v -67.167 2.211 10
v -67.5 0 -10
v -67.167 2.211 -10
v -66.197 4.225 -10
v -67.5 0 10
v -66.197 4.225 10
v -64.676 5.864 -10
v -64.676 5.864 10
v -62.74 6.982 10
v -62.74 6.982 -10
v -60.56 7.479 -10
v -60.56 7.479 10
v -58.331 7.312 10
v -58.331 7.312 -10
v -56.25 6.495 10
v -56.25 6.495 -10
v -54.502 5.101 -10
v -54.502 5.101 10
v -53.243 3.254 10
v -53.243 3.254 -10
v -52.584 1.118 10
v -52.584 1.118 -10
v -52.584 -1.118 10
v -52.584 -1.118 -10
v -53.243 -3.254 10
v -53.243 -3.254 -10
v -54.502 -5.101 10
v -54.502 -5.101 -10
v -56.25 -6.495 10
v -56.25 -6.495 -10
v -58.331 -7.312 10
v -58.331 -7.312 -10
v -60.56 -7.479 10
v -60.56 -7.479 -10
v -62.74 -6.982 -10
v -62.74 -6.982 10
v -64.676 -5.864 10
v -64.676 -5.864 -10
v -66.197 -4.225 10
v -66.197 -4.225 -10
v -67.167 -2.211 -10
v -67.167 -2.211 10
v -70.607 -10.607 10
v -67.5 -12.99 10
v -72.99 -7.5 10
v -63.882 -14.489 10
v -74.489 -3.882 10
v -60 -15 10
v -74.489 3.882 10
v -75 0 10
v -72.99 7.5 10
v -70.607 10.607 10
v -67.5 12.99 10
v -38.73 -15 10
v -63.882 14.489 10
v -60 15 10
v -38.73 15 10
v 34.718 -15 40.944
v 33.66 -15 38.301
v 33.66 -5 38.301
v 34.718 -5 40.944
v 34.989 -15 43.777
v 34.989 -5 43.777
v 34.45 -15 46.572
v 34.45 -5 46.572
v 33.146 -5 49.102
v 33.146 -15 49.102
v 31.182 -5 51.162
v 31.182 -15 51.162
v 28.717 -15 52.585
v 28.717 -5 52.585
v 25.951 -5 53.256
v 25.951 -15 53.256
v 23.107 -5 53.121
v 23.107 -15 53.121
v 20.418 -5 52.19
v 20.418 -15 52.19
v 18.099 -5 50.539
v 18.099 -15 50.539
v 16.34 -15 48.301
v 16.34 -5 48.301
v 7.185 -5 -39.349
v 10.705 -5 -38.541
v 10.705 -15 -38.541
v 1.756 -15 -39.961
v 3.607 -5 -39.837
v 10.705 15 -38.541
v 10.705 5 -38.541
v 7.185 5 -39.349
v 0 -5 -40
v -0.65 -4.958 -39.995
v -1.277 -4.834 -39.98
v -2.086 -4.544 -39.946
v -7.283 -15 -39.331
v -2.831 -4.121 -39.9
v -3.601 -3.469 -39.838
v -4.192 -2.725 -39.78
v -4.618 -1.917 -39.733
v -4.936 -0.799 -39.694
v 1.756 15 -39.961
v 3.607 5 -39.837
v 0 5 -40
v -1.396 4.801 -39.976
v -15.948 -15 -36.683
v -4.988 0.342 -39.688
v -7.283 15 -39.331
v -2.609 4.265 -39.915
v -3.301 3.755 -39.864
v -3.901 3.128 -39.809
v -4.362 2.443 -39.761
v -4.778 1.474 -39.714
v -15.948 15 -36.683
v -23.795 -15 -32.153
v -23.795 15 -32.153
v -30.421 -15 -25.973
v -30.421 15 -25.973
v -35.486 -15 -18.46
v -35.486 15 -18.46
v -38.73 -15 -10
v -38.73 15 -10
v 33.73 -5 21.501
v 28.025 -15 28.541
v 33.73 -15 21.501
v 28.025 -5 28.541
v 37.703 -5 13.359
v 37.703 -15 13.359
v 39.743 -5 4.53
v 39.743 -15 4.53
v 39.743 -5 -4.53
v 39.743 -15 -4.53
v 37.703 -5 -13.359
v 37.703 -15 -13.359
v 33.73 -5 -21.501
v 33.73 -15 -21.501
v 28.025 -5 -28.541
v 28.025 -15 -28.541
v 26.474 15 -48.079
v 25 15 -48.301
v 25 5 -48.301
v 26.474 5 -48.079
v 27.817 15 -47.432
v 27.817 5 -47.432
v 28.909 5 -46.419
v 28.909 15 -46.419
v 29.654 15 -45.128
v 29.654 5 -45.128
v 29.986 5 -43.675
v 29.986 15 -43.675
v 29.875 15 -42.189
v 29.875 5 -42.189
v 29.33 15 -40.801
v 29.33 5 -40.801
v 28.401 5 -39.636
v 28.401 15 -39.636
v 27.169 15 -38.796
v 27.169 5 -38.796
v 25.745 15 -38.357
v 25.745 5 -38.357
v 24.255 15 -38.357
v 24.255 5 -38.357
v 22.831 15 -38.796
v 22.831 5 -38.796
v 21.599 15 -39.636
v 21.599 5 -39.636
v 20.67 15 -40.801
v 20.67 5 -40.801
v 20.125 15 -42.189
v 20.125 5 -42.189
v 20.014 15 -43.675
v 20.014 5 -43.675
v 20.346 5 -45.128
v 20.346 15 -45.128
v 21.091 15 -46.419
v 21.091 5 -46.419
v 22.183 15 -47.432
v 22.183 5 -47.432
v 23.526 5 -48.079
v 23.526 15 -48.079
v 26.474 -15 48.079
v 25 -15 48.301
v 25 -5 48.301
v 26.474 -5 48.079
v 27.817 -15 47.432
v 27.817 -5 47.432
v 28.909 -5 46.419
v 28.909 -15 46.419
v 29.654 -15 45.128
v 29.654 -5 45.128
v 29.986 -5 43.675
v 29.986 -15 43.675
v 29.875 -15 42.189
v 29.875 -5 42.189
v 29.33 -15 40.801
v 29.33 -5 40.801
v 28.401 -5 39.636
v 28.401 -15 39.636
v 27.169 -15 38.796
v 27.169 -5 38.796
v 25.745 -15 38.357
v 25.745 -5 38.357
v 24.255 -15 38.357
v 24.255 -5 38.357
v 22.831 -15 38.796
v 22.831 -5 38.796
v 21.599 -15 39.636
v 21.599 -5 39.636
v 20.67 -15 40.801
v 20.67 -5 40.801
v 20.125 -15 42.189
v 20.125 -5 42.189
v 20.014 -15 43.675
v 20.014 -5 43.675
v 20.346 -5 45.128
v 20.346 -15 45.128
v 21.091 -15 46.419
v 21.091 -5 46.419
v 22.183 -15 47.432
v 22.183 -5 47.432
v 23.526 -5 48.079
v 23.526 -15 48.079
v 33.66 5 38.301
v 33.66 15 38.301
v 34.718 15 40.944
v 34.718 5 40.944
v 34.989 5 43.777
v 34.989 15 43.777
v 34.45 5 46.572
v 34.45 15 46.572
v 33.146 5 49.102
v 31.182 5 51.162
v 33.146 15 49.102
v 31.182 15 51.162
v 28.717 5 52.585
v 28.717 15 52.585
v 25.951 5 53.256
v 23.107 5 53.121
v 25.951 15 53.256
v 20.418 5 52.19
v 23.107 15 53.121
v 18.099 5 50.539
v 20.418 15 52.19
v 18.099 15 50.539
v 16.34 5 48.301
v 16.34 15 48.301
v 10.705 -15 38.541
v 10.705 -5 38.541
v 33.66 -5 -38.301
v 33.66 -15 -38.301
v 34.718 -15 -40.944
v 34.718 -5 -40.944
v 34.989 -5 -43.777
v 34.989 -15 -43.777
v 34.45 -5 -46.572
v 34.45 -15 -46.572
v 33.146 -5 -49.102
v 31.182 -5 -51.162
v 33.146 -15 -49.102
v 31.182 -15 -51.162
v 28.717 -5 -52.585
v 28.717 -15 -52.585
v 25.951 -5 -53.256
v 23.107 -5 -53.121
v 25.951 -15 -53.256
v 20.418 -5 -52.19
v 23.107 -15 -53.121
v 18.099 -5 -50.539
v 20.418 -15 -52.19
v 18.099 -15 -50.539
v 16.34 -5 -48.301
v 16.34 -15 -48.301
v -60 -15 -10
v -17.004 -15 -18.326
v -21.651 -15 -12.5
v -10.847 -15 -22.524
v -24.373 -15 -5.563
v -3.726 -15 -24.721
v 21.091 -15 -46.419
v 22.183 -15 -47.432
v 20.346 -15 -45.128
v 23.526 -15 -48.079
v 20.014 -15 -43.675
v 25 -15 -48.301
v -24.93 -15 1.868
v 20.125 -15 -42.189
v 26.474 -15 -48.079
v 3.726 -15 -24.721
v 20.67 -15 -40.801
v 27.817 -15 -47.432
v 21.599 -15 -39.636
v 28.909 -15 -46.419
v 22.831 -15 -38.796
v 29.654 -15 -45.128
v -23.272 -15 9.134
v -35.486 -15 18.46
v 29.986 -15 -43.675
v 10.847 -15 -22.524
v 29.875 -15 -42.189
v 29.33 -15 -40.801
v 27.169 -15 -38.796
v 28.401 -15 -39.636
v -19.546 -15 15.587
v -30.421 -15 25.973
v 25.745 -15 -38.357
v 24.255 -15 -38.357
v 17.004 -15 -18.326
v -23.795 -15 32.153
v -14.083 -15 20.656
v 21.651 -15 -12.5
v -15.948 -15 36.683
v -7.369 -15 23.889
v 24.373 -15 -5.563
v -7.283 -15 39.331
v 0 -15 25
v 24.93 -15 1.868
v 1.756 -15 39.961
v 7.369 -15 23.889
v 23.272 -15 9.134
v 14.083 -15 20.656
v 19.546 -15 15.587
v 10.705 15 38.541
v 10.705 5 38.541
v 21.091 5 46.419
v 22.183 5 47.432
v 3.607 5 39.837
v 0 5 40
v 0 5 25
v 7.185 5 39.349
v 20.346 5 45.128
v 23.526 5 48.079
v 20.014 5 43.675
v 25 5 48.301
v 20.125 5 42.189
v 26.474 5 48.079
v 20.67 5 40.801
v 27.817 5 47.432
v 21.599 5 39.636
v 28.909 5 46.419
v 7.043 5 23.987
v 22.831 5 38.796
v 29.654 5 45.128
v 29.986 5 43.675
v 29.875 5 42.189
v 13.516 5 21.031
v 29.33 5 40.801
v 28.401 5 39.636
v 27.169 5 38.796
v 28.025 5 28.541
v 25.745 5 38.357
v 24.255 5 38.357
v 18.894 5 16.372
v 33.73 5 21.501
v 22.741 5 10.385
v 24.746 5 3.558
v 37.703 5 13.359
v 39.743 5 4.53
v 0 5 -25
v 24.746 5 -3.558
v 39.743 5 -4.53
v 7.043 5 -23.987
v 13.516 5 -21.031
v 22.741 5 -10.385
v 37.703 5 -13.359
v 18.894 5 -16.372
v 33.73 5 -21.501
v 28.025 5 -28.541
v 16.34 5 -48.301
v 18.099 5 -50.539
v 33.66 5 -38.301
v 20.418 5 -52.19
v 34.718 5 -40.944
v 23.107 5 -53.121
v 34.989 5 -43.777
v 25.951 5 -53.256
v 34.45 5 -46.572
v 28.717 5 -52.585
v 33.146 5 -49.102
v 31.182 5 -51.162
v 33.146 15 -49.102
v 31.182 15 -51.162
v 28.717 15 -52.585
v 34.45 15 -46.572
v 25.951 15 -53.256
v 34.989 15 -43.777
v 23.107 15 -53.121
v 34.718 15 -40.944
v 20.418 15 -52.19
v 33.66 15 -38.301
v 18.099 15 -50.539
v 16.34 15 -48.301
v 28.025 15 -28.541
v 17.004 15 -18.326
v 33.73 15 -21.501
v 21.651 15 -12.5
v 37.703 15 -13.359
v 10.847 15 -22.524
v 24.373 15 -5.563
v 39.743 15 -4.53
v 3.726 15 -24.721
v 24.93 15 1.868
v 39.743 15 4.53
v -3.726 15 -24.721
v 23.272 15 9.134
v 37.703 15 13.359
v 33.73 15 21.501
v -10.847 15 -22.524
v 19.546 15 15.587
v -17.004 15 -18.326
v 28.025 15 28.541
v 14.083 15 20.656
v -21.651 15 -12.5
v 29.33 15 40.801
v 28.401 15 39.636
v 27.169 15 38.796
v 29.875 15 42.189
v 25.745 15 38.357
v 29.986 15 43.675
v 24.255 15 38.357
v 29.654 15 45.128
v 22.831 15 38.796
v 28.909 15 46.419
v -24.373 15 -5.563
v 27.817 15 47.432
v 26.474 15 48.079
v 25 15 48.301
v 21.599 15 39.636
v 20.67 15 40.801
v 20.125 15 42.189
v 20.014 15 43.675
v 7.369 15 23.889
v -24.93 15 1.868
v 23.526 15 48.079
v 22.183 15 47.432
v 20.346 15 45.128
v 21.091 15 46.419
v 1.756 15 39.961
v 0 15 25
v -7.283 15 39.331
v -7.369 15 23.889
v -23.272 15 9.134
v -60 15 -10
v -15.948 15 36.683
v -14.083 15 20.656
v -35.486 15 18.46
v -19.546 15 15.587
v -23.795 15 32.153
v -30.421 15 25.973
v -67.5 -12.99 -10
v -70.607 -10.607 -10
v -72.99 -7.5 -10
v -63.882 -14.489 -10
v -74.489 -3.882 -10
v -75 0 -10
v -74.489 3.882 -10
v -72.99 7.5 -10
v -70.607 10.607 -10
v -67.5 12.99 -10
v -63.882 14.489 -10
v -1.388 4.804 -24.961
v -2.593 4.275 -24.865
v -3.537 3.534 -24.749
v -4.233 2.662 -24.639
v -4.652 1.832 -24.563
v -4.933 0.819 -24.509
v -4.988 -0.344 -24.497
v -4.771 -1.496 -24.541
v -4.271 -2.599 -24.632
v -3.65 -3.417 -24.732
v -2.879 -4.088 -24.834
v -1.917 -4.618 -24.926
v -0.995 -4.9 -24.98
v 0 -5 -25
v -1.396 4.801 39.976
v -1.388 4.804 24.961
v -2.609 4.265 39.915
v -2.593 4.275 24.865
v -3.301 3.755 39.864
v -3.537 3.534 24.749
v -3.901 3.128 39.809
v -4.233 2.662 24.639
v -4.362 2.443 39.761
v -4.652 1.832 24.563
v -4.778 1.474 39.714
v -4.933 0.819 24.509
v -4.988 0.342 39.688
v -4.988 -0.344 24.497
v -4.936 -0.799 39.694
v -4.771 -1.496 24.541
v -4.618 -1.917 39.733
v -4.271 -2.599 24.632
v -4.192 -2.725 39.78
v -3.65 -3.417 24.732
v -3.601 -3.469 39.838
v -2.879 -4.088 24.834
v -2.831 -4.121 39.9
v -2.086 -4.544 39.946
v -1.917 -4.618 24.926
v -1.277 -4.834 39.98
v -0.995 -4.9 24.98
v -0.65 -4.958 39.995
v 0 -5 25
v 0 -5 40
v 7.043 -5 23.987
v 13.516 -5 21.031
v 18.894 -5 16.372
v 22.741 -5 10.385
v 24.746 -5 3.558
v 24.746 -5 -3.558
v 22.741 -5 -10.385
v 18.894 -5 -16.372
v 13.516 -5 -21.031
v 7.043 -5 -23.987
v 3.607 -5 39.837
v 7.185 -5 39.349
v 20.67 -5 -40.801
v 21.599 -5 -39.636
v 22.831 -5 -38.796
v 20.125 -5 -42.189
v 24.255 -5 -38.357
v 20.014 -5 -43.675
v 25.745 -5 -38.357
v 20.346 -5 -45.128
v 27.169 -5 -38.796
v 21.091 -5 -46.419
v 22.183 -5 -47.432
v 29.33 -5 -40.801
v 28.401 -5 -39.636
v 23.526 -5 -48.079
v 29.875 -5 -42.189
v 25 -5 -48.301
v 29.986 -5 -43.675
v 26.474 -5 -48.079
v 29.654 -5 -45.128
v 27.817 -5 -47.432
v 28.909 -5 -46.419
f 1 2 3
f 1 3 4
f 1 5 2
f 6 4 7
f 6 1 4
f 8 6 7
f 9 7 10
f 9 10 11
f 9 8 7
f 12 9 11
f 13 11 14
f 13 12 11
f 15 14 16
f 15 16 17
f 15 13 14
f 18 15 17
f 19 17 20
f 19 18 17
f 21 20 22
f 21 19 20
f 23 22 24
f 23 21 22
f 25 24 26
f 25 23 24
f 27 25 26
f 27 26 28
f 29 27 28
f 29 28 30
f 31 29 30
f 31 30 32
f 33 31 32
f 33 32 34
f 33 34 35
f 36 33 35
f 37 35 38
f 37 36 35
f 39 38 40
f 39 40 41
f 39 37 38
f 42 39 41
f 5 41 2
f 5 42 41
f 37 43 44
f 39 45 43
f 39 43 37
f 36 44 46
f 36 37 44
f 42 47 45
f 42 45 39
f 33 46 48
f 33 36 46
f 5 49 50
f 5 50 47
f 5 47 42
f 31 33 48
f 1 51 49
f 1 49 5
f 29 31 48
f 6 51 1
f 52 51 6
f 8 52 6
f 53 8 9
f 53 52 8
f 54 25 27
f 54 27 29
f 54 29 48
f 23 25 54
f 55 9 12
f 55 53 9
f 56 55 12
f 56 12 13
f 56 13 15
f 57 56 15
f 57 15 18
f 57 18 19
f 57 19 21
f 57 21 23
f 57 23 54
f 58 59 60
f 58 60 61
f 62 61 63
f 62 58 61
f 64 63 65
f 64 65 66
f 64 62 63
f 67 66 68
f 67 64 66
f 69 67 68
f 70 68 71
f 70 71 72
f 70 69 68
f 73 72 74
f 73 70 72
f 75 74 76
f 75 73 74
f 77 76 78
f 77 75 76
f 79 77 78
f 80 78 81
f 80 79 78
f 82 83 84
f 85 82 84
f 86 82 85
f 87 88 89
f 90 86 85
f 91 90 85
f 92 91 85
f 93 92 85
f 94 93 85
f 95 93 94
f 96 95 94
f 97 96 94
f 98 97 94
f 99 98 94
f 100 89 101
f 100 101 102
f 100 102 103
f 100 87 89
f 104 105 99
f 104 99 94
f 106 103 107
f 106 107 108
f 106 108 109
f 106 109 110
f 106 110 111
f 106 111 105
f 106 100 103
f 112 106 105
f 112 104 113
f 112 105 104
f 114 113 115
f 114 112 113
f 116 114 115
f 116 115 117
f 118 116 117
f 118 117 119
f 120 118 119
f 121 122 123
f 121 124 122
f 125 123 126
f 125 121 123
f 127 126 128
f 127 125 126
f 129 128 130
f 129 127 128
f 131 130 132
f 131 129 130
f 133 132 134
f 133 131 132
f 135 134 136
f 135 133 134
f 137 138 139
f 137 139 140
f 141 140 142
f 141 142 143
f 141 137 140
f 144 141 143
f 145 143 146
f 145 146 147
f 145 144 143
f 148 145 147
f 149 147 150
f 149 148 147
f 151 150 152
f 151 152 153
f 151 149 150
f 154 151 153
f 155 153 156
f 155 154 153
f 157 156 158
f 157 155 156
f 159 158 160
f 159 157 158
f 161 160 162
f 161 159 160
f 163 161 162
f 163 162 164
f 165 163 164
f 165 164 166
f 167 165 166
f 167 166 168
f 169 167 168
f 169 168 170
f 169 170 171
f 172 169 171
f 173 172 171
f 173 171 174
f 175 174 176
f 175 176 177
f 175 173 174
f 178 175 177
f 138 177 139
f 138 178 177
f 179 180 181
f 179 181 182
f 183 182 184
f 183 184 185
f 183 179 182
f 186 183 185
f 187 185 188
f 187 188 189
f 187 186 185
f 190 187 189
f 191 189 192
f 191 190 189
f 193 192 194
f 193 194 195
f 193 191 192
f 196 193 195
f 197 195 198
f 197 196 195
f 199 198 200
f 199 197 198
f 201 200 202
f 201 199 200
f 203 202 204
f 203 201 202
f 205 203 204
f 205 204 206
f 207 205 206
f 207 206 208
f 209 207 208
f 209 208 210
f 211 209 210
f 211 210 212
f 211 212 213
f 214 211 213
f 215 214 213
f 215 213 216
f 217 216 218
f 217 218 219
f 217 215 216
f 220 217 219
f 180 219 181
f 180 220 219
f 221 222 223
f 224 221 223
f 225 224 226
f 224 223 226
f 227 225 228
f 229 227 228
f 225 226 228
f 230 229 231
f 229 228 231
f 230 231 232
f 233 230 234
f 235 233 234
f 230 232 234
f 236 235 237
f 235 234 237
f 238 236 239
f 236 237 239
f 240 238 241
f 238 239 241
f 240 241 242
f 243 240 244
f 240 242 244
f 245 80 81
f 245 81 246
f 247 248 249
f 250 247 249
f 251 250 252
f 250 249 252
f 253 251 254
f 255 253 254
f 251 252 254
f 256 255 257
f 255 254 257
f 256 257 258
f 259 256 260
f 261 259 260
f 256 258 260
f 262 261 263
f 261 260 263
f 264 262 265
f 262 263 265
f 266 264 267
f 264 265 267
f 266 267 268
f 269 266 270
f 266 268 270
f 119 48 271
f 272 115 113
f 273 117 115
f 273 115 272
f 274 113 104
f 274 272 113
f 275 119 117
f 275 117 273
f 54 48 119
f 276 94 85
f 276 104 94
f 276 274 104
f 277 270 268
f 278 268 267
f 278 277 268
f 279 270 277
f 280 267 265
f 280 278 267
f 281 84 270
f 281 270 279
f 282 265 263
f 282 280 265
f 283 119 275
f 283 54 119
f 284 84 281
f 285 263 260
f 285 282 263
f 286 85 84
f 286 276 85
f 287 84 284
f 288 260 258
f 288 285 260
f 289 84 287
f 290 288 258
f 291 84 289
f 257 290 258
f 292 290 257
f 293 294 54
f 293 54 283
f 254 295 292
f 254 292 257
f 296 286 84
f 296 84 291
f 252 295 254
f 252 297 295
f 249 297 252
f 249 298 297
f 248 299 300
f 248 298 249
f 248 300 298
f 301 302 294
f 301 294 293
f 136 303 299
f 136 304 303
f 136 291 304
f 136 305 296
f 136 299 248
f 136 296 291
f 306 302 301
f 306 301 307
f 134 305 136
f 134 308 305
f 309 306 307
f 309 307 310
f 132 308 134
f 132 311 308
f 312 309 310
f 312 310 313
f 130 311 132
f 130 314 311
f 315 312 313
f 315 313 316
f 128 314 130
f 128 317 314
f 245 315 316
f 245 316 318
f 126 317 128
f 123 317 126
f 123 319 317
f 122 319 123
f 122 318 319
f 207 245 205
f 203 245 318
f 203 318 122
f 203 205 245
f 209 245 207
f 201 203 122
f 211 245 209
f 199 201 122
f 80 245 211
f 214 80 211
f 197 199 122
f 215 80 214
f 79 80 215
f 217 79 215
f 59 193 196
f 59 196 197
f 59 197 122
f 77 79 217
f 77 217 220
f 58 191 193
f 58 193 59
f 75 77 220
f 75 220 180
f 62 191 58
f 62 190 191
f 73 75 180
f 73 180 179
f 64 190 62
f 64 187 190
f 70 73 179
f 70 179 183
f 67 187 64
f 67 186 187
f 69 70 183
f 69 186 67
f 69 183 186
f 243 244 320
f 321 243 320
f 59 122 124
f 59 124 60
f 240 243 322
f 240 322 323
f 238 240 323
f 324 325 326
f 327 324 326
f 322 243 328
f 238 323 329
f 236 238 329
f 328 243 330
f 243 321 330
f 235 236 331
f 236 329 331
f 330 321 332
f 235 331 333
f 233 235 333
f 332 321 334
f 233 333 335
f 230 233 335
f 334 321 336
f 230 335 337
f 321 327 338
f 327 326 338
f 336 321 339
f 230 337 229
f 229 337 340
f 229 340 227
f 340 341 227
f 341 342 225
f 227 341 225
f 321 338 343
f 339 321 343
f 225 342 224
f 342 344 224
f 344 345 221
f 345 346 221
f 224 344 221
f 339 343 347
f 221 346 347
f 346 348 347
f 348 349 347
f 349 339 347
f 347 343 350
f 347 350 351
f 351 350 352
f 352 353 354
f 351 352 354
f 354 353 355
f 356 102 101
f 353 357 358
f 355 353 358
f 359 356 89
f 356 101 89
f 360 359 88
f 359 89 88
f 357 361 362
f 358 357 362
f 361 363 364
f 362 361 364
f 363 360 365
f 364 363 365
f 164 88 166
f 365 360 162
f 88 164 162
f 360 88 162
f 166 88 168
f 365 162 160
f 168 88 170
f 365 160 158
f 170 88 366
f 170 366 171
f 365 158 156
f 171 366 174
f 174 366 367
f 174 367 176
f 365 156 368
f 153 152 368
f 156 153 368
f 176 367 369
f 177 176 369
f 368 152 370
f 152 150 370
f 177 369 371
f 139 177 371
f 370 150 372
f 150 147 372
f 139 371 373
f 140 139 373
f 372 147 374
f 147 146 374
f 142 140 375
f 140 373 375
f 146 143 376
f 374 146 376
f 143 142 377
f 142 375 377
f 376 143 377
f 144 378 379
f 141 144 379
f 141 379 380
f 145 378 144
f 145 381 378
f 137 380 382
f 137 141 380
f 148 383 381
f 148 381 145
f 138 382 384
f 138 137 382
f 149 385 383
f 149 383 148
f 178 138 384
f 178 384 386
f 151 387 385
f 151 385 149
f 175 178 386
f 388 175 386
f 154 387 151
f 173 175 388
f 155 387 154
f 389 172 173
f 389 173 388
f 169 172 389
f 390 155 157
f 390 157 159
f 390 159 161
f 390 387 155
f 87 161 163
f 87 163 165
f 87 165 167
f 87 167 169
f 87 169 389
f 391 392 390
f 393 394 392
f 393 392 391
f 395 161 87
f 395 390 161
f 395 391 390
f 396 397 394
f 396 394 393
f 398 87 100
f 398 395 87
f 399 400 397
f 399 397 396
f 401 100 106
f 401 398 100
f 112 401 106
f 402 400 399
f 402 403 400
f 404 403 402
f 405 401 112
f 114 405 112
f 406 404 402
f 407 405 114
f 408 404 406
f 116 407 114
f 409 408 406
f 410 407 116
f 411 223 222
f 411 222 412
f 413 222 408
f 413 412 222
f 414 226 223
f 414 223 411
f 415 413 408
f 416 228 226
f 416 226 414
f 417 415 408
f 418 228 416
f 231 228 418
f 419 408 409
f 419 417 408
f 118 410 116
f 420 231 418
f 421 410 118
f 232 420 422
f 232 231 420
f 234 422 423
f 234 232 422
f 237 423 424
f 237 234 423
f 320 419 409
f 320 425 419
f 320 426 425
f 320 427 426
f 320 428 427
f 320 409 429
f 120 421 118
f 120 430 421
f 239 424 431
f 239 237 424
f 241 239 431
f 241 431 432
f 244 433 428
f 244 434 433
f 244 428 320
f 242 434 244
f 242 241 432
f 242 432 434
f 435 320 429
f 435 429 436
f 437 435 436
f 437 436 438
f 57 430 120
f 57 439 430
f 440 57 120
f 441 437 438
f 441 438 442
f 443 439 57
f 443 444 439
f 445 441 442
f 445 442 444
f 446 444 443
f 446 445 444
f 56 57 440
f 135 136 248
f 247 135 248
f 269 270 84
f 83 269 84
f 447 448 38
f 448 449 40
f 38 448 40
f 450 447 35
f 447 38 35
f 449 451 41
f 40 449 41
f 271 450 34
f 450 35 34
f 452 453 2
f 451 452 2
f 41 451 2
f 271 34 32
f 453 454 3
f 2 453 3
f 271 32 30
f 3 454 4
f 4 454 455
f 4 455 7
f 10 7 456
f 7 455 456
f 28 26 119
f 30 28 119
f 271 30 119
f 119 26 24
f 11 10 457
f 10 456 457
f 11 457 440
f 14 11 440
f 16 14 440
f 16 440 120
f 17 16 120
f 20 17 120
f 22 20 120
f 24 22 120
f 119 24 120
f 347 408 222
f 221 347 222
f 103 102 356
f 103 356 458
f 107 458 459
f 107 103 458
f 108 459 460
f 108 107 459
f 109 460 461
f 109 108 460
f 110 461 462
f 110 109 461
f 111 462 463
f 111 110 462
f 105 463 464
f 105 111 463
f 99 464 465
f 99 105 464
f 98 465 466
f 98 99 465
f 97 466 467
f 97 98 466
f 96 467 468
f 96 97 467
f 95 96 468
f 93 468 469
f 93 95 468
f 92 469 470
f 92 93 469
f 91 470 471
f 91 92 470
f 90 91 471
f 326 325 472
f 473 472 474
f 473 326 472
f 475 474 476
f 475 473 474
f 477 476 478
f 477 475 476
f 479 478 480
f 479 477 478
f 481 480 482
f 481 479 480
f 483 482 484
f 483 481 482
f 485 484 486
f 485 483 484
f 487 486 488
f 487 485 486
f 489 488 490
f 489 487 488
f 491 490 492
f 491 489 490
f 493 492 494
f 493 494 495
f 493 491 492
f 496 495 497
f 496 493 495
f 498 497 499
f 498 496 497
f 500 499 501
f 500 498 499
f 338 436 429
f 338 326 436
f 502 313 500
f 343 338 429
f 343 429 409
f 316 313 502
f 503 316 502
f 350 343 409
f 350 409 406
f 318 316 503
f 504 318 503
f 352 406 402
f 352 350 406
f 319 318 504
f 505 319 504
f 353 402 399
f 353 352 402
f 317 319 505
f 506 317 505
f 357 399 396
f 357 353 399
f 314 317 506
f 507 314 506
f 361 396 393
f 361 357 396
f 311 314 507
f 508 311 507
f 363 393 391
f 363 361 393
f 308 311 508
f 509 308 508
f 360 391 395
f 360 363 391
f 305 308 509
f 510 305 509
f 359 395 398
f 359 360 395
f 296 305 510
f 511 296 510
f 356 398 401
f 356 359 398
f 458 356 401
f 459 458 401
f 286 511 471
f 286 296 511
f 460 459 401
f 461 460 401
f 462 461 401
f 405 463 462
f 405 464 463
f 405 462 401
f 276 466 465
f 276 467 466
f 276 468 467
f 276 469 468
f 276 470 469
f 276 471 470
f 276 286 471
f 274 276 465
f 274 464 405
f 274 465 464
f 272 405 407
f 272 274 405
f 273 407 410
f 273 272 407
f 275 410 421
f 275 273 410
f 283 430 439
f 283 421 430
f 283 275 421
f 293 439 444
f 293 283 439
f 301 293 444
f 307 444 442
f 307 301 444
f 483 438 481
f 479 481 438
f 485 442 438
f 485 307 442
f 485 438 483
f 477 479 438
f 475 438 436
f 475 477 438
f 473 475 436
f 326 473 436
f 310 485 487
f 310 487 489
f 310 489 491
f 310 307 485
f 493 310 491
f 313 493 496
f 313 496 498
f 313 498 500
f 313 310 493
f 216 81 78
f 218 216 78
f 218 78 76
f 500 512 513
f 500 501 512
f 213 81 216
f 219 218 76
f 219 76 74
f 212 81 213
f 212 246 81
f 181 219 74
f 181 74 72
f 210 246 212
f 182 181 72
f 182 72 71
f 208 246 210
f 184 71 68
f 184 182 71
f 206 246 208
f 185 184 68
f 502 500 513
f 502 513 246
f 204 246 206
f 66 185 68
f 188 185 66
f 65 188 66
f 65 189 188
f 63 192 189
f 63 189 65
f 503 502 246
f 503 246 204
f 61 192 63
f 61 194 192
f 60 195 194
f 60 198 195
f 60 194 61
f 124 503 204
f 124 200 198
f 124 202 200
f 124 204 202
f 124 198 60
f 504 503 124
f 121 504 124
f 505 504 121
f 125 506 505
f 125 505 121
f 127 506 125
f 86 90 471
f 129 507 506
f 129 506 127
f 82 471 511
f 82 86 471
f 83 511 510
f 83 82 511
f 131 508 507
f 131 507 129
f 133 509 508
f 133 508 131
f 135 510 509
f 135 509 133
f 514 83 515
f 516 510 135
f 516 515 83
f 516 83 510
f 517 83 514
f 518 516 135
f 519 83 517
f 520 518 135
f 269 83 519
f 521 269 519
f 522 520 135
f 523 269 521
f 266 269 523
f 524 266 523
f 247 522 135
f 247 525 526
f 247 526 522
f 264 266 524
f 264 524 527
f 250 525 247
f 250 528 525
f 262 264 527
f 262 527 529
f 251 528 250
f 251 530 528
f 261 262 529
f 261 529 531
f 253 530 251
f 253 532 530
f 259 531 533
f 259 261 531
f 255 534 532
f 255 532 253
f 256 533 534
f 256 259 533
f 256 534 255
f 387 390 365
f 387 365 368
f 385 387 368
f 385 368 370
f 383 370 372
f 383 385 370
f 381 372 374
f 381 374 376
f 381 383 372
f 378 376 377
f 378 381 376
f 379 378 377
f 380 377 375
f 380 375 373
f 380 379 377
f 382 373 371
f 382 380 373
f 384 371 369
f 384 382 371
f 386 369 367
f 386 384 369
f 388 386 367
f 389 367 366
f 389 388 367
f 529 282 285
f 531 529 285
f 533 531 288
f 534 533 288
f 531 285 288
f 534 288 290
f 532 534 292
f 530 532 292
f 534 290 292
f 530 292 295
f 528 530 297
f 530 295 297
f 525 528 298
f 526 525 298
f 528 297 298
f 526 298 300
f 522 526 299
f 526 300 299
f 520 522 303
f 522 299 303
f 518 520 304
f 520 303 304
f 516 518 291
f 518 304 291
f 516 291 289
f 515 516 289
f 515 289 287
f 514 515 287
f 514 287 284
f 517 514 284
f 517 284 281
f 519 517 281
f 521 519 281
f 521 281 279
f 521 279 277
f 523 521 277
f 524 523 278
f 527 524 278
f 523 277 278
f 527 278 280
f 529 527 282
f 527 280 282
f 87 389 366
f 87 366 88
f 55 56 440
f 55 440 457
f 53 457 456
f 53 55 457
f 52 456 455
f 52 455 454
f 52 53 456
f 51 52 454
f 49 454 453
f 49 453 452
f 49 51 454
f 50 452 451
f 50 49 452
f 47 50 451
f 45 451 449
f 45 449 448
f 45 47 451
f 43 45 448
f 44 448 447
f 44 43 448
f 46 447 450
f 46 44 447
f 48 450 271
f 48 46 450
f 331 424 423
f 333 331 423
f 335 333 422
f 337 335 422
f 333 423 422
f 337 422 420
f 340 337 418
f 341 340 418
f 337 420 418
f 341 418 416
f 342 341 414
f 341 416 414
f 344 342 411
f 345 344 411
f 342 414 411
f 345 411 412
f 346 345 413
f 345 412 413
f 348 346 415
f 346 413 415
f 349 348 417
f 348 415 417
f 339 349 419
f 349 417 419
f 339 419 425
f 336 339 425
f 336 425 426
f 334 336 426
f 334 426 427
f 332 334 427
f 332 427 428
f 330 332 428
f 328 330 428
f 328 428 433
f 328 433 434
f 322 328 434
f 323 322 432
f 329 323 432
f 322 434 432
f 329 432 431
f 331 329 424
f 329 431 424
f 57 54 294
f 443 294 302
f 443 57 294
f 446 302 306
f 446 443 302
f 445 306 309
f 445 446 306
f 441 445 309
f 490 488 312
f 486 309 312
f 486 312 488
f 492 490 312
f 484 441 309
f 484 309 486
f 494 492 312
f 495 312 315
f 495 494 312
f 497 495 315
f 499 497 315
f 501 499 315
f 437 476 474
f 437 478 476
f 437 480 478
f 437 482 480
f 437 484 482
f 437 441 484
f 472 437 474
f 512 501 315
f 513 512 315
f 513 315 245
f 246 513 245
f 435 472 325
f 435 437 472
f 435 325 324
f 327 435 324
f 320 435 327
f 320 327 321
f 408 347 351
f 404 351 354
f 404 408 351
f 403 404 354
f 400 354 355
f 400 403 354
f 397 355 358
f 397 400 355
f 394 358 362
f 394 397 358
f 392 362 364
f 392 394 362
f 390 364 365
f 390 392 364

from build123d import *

# Parameters (mm, degrees)
SKETCH1_R               = 40
SKETCH1_R_2             = 25
BOSS_EXTRUDE1_DEPTH     = 15
CUT_EXTRUDE1_DEPTH      = 59.523499554
CUT_EXTRUDE1_DEPTH_BACK = 59.523499554
SKETCH2_R               = 5
SKETCH2_W               = 40
SKETCH2_H               = 10
BOSS_EXTRUDE2_START     = 15
SKETCH3_R               = 5
BOSS_EXTRUDE2_DEPTH     = 10
MIRROR2_START           = 15
MIRROR2_COPY_1_SKETCH_R = 5
MIRROR2_COPY_1_DEPTH    = 10
BOSS_EXTRUDE4_DEPTH     = 10


with BuildPart() as part:
    # Sketch1 → Boss-Extrude1 (new, symmetric)
    with BuildSketch(Plane(origin=(0, 0, 0), x_dir=(1, 0, 0), z_dir=(0, 1, 0))):
        with Locations(Location((0, 0, 0), (0, 0, 270))):
            Circle(SKETCH1_R)
        with Locations(Location((0, 0, 0), (0, 0, 270))):
            Circle(SKETCH1_R_2, mode=Mode.SUBTRACT)
    extrude(amount=BOSS_EXTRUDE1_DEPTH, both=True)

    # Sketch2 → Cut-Extrude1 (cut, two sides: drawn at the far end of the back side and taken through both)
    with BuildSketch(Plane.XY.offset(-CUT_EXTRUDE1_DEPTH_BACK)):
        Circle(SKETCH2_R)
        with Locations((20, 0)):
            Rectangle(SKETCH2_W, SKETCH2_H)
    extrude(amount=CUT_EXTRUDE1_DEPTH + CUT_EXTRUDE1_DEPTH_BACK, mode=Mode.SUBTRACT)

    # Sketch3 → Boss-Extrude2 (add)
    with BuildSketch(Plane(origin=(0, 0, 0), x_dir=(1, 0, 0), z_dir=(0, 1, 0)).offset(BOSS_EXTRUDE2_START)):
        with BuildLine():
            Line((16.339745962, -48.301270189), (10.704662693, -38.541019662))
            ThreePointArc((10.704662693, -38.541019662), (20, -34.641016151), (28.025170769, -28.541019662))
            Line((28.025170769, -28.541019662), (33.660254038, -38.301270189))
            ThreePointArc((33.660254038, -38.301270189), (30, -51.961524227), (16.339745962, -48.301270189))
        make_face()
        with Locations(Location((25, -43.301270189, 0), (0, 0, 270))):
            Circle(SKETCH3_R, mode=Mode.SUBTRACT)
    boss_extrude2 = extrude(amount=-BOSS_EXTRUDE2_DEPTH)

    # Mirror1: Boss-Extrude2 across plane
    add(boss_extrude2.mirror(Plane.XY))

    # Mirror2: Boss-Extrude2 across plane
    add(boss_extrude2.mirror(Plane.ZX))

    # Mirror2 copy 1 sketch → Mirror2 copy 1 (add)
    with BuildSketch(Plane.XZ.offset(MIRROR2_START)):
        with BuildLine():
            Line((16.339745962, -48.301270189), (10.704662693, -38.541019662))
            ThreePointArc((10.704662693, -38.541019662), (20, -34.641016151), (28.025170769, -28.541019662))
            Line((28.025170769, -28.541019662), (33.660254038, -38.301270189))
            ThreePointArc((33.660254038, -38.301270189), (30, -51.961524227), (16.339745962, -48.301270189))
        make_face()
        with Locations(Location((25, -43.301270189, 0), (0, 0, 270))):
            Circle(MIRROR2_COPY_1_SKETCH_R, mode=Mode.SUBTRACT)
    extrude(amount=-MIRROR2_COPY_1_DEPTH)

    # Sketch4 → Boss-Extrude4 (add, symmetric)
    with BuildSketch(Plane.XY):
        with BuildLine():
            ThreePointArc((-60, -15), (-49.393398282, -10.606601718), (-45, 0))
            Line((-45, 0), (-52.5, 0))
            ThreePointArc((-52.5, 0), (-60, -7.5), (-67.5, 0))
            Line((-67.5, 0), (-75, 0))
            ThreePointArc((-75, 0), (-70.606601718, -10.606601718), (-60, -15))
        make_face()
        with BuildLine():
            Line((-52.5, 0), (-45, 0))
            ThreePointArc((-45, 0), (-49.393398282, 10.606601718), (-60, 15))
            ThreePointArc((-60, 15), (-70.606601718, 10.606601718), (-75, 0))
            Line((-75, 0), (-67.5, 0))
            ThreePointArc((-67.5, 0), (-60, 7.5), (-52.5, 0))
        make_face()
        with BuildLine():
            ThreePointArc((-60, 15), (-49.393398282, 10.606601718), (-45, 0))
            Line((-45, 0), (-25, 0))
            Line((-25, 0), (-25, 15))
            Line((-25, 15), (-60, 15))
        make_face()
        with BuildLine():
            Line((-25, 0), (-45, 0))
            ThreePointArc((-45, 0), (-49.393398282, -10.606601718), (-60, -15))
            Line((-60, -15), (-25, -15))
            Line((-25, -15), (-25, 0))
        make_face()
    extrude(amount=BOSS_EXTRUDE4_DEPTH, both=True)


solid = part.part
